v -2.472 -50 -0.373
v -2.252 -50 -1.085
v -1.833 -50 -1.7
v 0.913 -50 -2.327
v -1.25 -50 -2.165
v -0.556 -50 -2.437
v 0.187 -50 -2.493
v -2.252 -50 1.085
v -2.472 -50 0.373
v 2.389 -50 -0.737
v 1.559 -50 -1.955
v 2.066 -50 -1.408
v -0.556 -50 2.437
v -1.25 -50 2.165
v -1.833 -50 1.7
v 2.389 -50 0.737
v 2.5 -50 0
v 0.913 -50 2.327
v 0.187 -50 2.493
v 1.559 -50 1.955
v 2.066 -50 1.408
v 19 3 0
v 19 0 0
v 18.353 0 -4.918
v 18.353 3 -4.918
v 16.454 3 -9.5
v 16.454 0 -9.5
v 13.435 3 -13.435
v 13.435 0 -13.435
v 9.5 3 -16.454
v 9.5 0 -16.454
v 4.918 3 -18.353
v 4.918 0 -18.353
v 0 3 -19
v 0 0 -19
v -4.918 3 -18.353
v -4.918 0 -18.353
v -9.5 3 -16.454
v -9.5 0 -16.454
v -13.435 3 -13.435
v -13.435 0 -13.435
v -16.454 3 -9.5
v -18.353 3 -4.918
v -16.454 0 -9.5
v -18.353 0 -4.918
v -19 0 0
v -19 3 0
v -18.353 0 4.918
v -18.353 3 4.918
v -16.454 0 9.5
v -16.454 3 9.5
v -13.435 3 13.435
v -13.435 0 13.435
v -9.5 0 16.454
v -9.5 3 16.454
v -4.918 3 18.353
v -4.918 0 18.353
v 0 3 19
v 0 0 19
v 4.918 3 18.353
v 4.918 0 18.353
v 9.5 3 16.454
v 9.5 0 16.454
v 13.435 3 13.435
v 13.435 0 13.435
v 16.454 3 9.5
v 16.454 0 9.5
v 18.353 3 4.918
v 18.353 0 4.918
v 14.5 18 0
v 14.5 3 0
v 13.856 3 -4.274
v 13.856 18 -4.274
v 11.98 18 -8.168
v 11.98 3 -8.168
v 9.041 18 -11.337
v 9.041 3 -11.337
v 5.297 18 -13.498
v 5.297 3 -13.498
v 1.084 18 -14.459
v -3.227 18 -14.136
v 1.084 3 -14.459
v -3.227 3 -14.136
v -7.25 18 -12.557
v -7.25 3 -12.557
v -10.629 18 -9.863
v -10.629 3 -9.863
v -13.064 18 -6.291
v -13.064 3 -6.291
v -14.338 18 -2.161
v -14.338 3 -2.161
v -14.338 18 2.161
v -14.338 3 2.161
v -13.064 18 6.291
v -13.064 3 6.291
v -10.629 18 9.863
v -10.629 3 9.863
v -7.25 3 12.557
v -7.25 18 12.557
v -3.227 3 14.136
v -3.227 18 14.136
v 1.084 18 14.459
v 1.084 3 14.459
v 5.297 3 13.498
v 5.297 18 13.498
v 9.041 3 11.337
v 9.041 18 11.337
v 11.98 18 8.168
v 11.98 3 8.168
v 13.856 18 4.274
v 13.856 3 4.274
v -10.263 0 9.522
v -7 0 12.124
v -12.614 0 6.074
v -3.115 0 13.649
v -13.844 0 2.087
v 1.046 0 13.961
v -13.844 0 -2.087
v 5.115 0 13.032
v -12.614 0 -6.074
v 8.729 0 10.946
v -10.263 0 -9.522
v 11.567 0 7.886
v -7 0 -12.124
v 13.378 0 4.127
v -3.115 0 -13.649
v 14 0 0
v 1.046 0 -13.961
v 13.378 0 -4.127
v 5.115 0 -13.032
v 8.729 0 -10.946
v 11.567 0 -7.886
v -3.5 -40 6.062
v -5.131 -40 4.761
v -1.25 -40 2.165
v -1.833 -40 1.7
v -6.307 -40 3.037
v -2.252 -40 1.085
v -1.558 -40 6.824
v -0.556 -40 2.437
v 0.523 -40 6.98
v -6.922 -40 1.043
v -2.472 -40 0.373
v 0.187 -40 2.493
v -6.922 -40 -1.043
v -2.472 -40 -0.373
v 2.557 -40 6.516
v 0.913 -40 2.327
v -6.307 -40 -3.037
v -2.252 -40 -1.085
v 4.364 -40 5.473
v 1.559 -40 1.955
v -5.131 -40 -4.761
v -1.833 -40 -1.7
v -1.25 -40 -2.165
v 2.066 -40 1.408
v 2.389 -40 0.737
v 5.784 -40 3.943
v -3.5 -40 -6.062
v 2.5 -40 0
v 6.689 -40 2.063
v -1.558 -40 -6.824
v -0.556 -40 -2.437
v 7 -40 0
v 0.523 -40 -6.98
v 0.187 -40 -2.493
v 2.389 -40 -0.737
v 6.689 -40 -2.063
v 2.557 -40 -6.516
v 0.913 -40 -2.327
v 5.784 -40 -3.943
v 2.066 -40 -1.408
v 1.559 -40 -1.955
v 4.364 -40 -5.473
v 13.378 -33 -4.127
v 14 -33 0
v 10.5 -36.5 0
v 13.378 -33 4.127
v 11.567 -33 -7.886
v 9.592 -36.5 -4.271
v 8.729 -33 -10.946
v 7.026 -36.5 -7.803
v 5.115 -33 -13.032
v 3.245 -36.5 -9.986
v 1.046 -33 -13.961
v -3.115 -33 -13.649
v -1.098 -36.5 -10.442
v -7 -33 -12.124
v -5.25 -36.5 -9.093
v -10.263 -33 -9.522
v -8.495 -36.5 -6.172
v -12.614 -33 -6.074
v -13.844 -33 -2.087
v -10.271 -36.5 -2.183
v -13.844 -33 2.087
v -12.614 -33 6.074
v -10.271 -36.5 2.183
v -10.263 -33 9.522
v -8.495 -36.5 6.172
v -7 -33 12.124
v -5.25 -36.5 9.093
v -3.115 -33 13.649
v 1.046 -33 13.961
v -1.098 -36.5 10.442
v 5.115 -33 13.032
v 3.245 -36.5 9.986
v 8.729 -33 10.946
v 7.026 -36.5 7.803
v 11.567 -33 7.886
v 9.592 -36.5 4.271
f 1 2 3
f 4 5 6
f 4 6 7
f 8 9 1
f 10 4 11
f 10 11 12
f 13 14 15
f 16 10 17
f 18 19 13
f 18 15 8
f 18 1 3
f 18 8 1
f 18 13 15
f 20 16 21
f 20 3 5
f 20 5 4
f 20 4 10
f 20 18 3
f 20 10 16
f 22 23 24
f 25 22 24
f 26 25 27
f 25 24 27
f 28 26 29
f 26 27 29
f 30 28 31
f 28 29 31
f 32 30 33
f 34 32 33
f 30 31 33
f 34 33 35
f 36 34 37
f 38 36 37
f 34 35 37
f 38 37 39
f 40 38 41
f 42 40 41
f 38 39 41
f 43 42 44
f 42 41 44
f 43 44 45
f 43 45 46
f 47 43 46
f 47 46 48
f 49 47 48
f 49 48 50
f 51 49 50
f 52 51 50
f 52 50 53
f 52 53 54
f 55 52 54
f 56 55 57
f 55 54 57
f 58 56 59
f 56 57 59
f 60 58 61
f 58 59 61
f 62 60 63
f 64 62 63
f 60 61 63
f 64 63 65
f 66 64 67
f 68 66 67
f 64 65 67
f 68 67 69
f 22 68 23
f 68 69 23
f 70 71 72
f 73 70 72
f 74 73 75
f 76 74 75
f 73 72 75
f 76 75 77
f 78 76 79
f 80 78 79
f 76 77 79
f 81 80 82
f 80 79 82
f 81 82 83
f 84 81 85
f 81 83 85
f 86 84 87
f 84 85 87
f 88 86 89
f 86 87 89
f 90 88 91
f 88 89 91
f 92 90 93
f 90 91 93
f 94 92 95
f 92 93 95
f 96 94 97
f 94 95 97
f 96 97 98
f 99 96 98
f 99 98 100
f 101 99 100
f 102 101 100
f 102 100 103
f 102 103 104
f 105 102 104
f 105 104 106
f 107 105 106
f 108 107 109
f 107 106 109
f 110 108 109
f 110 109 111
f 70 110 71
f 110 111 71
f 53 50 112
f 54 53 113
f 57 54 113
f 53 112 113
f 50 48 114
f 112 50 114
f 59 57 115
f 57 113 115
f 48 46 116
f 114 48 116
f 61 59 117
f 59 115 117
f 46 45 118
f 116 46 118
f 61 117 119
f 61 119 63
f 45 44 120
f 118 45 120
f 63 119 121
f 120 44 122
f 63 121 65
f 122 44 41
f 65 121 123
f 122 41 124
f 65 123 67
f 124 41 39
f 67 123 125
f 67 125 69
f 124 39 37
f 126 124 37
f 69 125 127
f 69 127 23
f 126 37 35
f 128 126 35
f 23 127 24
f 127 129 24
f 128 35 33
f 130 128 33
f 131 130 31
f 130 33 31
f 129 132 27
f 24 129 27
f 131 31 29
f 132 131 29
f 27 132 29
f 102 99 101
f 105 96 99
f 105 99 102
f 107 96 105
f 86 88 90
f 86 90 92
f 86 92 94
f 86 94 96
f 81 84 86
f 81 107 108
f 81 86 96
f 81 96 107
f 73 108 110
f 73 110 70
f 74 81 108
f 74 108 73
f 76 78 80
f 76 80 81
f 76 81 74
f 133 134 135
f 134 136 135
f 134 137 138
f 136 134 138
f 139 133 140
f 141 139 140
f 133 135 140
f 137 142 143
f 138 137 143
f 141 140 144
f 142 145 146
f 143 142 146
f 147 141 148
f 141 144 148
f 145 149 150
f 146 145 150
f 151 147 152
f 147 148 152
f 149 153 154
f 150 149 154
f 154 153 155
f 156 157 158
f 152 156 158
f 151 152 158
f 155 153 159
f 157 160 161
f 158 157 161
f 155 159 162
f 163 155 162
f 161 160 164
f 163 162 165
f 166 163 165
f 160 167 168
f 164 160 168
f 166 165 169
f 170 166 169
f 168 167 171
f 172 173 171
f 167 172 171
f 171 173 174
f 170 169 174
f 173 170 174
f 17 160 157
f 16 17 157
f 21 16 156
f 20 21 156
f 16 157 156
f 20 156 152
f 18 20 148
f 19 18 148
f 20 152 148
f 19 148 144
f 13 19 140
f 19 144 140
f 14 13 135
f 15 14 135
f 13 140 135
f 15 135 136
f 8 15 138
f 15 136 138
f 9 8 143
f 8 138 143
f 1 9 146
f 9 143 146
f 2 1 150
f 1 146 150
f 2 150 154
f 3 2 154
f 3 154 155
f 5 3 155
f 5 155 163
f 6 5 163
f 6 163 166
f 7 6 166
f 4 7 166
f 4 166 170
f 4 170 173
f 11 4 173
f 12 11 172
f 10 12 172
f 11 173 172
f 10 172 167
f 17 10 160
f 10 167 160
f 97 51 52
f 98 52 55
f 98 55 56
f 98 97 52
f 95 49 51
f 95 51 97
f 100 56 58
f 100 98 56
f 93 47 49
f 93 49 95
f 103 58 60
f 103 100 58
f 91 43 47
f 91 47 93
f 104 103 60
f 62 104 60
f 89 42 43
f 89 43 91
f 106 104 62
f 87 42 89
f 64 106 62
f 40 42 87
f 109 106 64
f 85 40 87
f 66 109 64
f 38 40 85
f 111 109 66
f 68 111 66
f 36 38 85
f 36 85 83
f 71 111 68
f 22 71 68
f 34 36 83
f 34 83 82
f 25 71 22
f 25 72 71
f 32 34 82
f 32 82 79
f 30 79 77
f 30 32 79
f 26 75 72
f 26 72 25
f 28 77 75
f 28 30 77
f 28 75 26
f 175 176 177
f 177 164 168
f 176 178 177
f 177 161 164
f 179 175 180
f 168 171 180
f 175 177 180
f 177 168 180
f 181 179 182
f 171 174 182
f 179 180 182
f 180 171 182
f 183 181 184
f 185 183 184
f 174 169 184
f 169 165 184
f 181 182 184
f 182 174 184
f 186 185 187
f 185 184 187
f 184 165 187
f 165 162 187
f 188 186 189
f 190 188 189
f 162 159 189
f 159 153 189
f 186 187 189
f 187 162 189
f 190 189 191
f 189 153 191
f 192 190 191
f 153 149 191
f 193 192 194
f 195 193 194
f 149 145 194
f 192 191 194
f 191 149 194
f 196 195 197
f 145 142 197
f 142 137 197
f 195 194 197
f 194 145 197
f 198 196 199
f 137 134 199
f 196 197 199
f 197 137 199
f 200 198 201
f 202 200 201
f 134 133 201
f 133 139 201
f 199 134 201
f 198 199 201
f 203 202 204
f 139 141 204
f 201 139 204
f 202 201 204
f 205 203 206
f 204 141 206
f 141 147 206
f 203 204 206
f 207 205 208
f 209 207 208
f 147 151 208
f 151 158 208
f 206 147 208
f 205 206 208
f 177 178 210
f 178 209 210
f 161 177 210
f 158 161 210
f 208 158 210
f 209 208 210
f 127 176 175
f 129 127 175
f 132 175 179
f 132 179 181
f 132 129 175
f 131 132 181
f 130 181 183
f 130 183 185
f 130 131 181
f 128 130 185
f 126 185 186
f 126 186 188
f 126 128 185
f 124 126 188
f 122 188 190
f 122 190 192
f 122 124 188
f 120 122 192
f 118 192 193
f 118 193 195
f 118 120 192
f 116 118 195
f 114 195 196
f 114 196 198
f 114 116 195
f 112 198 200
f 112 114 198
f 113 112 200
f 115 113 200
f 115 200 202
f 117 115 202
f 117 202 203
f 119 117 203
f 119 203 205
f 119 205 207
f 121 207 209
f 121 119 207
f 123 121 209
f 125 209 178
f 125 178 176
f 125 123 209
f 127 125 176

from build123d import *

# Parameters (mm, degrees)
SKETCH_1_R      = 14
EXTRUDE_1_DEPTH = 40
CHAMFER_1_SIZE  = 7
SKETCH_2_R      = 19
EXTRUDE_2_DEPTH = 3
SKETCH_3_R      = 14.5
EXTRUDE_3_DEPTH = 15
SKETCH_4_R      = 2.5
EXTRUDE_4_DEPTH = 10


with BuildPart() as part:
    # Эскиз1 → Бобышка-Вытянуть1 (new body)
    with BuildSketch(Plane(origin=(0, 0, 0), x_dir=(1, 0, 0), z_dir=(0, 1, 0))):
        Circle(SKETCH_1_R)
    extrude(amount=-EXTRUDE_1_DEPTH)

    # Фаска1
    chamfer_1_edges = [part.edges().sort_by_distance(p)[0] for p in [
        (-14, -40, 0),
    ]]
    chamfer(chamfer_1_edges, length=CHAMFER_1_SIZE)

    # Эскиз2 → Бобышка-Вытянуть2 (add)
    with BuildSketch(Plane(origin=(0, 0, 0), x_dir=(1, 0, 0), z_dir=(0, 1, 0))):
        Circle(SKETCH_2_R)
    extrude(amount=EXTRUDE_2_DEPTH)

    # Эскиз3 → Бобышка-Вытянуть3 (add)
    with BuildSketch(Plane(origin=(0, 3, 0), x_dir=(1, 0, 0), z_dir=(0, 1, 0))):
        Circle(SKETCH_3_R)
    extrude(amount=EXTRUDE_3_DEPTH)

    # Эскиз4 → Бобышка-Вытянуть4 (add)
    with BuildSketch(Plane.XZ.offset(40)):
        Circle(SKETCH_4_R)
    extrude(amount=EXTRUDE_4_DEPTH)


solid = part.part
